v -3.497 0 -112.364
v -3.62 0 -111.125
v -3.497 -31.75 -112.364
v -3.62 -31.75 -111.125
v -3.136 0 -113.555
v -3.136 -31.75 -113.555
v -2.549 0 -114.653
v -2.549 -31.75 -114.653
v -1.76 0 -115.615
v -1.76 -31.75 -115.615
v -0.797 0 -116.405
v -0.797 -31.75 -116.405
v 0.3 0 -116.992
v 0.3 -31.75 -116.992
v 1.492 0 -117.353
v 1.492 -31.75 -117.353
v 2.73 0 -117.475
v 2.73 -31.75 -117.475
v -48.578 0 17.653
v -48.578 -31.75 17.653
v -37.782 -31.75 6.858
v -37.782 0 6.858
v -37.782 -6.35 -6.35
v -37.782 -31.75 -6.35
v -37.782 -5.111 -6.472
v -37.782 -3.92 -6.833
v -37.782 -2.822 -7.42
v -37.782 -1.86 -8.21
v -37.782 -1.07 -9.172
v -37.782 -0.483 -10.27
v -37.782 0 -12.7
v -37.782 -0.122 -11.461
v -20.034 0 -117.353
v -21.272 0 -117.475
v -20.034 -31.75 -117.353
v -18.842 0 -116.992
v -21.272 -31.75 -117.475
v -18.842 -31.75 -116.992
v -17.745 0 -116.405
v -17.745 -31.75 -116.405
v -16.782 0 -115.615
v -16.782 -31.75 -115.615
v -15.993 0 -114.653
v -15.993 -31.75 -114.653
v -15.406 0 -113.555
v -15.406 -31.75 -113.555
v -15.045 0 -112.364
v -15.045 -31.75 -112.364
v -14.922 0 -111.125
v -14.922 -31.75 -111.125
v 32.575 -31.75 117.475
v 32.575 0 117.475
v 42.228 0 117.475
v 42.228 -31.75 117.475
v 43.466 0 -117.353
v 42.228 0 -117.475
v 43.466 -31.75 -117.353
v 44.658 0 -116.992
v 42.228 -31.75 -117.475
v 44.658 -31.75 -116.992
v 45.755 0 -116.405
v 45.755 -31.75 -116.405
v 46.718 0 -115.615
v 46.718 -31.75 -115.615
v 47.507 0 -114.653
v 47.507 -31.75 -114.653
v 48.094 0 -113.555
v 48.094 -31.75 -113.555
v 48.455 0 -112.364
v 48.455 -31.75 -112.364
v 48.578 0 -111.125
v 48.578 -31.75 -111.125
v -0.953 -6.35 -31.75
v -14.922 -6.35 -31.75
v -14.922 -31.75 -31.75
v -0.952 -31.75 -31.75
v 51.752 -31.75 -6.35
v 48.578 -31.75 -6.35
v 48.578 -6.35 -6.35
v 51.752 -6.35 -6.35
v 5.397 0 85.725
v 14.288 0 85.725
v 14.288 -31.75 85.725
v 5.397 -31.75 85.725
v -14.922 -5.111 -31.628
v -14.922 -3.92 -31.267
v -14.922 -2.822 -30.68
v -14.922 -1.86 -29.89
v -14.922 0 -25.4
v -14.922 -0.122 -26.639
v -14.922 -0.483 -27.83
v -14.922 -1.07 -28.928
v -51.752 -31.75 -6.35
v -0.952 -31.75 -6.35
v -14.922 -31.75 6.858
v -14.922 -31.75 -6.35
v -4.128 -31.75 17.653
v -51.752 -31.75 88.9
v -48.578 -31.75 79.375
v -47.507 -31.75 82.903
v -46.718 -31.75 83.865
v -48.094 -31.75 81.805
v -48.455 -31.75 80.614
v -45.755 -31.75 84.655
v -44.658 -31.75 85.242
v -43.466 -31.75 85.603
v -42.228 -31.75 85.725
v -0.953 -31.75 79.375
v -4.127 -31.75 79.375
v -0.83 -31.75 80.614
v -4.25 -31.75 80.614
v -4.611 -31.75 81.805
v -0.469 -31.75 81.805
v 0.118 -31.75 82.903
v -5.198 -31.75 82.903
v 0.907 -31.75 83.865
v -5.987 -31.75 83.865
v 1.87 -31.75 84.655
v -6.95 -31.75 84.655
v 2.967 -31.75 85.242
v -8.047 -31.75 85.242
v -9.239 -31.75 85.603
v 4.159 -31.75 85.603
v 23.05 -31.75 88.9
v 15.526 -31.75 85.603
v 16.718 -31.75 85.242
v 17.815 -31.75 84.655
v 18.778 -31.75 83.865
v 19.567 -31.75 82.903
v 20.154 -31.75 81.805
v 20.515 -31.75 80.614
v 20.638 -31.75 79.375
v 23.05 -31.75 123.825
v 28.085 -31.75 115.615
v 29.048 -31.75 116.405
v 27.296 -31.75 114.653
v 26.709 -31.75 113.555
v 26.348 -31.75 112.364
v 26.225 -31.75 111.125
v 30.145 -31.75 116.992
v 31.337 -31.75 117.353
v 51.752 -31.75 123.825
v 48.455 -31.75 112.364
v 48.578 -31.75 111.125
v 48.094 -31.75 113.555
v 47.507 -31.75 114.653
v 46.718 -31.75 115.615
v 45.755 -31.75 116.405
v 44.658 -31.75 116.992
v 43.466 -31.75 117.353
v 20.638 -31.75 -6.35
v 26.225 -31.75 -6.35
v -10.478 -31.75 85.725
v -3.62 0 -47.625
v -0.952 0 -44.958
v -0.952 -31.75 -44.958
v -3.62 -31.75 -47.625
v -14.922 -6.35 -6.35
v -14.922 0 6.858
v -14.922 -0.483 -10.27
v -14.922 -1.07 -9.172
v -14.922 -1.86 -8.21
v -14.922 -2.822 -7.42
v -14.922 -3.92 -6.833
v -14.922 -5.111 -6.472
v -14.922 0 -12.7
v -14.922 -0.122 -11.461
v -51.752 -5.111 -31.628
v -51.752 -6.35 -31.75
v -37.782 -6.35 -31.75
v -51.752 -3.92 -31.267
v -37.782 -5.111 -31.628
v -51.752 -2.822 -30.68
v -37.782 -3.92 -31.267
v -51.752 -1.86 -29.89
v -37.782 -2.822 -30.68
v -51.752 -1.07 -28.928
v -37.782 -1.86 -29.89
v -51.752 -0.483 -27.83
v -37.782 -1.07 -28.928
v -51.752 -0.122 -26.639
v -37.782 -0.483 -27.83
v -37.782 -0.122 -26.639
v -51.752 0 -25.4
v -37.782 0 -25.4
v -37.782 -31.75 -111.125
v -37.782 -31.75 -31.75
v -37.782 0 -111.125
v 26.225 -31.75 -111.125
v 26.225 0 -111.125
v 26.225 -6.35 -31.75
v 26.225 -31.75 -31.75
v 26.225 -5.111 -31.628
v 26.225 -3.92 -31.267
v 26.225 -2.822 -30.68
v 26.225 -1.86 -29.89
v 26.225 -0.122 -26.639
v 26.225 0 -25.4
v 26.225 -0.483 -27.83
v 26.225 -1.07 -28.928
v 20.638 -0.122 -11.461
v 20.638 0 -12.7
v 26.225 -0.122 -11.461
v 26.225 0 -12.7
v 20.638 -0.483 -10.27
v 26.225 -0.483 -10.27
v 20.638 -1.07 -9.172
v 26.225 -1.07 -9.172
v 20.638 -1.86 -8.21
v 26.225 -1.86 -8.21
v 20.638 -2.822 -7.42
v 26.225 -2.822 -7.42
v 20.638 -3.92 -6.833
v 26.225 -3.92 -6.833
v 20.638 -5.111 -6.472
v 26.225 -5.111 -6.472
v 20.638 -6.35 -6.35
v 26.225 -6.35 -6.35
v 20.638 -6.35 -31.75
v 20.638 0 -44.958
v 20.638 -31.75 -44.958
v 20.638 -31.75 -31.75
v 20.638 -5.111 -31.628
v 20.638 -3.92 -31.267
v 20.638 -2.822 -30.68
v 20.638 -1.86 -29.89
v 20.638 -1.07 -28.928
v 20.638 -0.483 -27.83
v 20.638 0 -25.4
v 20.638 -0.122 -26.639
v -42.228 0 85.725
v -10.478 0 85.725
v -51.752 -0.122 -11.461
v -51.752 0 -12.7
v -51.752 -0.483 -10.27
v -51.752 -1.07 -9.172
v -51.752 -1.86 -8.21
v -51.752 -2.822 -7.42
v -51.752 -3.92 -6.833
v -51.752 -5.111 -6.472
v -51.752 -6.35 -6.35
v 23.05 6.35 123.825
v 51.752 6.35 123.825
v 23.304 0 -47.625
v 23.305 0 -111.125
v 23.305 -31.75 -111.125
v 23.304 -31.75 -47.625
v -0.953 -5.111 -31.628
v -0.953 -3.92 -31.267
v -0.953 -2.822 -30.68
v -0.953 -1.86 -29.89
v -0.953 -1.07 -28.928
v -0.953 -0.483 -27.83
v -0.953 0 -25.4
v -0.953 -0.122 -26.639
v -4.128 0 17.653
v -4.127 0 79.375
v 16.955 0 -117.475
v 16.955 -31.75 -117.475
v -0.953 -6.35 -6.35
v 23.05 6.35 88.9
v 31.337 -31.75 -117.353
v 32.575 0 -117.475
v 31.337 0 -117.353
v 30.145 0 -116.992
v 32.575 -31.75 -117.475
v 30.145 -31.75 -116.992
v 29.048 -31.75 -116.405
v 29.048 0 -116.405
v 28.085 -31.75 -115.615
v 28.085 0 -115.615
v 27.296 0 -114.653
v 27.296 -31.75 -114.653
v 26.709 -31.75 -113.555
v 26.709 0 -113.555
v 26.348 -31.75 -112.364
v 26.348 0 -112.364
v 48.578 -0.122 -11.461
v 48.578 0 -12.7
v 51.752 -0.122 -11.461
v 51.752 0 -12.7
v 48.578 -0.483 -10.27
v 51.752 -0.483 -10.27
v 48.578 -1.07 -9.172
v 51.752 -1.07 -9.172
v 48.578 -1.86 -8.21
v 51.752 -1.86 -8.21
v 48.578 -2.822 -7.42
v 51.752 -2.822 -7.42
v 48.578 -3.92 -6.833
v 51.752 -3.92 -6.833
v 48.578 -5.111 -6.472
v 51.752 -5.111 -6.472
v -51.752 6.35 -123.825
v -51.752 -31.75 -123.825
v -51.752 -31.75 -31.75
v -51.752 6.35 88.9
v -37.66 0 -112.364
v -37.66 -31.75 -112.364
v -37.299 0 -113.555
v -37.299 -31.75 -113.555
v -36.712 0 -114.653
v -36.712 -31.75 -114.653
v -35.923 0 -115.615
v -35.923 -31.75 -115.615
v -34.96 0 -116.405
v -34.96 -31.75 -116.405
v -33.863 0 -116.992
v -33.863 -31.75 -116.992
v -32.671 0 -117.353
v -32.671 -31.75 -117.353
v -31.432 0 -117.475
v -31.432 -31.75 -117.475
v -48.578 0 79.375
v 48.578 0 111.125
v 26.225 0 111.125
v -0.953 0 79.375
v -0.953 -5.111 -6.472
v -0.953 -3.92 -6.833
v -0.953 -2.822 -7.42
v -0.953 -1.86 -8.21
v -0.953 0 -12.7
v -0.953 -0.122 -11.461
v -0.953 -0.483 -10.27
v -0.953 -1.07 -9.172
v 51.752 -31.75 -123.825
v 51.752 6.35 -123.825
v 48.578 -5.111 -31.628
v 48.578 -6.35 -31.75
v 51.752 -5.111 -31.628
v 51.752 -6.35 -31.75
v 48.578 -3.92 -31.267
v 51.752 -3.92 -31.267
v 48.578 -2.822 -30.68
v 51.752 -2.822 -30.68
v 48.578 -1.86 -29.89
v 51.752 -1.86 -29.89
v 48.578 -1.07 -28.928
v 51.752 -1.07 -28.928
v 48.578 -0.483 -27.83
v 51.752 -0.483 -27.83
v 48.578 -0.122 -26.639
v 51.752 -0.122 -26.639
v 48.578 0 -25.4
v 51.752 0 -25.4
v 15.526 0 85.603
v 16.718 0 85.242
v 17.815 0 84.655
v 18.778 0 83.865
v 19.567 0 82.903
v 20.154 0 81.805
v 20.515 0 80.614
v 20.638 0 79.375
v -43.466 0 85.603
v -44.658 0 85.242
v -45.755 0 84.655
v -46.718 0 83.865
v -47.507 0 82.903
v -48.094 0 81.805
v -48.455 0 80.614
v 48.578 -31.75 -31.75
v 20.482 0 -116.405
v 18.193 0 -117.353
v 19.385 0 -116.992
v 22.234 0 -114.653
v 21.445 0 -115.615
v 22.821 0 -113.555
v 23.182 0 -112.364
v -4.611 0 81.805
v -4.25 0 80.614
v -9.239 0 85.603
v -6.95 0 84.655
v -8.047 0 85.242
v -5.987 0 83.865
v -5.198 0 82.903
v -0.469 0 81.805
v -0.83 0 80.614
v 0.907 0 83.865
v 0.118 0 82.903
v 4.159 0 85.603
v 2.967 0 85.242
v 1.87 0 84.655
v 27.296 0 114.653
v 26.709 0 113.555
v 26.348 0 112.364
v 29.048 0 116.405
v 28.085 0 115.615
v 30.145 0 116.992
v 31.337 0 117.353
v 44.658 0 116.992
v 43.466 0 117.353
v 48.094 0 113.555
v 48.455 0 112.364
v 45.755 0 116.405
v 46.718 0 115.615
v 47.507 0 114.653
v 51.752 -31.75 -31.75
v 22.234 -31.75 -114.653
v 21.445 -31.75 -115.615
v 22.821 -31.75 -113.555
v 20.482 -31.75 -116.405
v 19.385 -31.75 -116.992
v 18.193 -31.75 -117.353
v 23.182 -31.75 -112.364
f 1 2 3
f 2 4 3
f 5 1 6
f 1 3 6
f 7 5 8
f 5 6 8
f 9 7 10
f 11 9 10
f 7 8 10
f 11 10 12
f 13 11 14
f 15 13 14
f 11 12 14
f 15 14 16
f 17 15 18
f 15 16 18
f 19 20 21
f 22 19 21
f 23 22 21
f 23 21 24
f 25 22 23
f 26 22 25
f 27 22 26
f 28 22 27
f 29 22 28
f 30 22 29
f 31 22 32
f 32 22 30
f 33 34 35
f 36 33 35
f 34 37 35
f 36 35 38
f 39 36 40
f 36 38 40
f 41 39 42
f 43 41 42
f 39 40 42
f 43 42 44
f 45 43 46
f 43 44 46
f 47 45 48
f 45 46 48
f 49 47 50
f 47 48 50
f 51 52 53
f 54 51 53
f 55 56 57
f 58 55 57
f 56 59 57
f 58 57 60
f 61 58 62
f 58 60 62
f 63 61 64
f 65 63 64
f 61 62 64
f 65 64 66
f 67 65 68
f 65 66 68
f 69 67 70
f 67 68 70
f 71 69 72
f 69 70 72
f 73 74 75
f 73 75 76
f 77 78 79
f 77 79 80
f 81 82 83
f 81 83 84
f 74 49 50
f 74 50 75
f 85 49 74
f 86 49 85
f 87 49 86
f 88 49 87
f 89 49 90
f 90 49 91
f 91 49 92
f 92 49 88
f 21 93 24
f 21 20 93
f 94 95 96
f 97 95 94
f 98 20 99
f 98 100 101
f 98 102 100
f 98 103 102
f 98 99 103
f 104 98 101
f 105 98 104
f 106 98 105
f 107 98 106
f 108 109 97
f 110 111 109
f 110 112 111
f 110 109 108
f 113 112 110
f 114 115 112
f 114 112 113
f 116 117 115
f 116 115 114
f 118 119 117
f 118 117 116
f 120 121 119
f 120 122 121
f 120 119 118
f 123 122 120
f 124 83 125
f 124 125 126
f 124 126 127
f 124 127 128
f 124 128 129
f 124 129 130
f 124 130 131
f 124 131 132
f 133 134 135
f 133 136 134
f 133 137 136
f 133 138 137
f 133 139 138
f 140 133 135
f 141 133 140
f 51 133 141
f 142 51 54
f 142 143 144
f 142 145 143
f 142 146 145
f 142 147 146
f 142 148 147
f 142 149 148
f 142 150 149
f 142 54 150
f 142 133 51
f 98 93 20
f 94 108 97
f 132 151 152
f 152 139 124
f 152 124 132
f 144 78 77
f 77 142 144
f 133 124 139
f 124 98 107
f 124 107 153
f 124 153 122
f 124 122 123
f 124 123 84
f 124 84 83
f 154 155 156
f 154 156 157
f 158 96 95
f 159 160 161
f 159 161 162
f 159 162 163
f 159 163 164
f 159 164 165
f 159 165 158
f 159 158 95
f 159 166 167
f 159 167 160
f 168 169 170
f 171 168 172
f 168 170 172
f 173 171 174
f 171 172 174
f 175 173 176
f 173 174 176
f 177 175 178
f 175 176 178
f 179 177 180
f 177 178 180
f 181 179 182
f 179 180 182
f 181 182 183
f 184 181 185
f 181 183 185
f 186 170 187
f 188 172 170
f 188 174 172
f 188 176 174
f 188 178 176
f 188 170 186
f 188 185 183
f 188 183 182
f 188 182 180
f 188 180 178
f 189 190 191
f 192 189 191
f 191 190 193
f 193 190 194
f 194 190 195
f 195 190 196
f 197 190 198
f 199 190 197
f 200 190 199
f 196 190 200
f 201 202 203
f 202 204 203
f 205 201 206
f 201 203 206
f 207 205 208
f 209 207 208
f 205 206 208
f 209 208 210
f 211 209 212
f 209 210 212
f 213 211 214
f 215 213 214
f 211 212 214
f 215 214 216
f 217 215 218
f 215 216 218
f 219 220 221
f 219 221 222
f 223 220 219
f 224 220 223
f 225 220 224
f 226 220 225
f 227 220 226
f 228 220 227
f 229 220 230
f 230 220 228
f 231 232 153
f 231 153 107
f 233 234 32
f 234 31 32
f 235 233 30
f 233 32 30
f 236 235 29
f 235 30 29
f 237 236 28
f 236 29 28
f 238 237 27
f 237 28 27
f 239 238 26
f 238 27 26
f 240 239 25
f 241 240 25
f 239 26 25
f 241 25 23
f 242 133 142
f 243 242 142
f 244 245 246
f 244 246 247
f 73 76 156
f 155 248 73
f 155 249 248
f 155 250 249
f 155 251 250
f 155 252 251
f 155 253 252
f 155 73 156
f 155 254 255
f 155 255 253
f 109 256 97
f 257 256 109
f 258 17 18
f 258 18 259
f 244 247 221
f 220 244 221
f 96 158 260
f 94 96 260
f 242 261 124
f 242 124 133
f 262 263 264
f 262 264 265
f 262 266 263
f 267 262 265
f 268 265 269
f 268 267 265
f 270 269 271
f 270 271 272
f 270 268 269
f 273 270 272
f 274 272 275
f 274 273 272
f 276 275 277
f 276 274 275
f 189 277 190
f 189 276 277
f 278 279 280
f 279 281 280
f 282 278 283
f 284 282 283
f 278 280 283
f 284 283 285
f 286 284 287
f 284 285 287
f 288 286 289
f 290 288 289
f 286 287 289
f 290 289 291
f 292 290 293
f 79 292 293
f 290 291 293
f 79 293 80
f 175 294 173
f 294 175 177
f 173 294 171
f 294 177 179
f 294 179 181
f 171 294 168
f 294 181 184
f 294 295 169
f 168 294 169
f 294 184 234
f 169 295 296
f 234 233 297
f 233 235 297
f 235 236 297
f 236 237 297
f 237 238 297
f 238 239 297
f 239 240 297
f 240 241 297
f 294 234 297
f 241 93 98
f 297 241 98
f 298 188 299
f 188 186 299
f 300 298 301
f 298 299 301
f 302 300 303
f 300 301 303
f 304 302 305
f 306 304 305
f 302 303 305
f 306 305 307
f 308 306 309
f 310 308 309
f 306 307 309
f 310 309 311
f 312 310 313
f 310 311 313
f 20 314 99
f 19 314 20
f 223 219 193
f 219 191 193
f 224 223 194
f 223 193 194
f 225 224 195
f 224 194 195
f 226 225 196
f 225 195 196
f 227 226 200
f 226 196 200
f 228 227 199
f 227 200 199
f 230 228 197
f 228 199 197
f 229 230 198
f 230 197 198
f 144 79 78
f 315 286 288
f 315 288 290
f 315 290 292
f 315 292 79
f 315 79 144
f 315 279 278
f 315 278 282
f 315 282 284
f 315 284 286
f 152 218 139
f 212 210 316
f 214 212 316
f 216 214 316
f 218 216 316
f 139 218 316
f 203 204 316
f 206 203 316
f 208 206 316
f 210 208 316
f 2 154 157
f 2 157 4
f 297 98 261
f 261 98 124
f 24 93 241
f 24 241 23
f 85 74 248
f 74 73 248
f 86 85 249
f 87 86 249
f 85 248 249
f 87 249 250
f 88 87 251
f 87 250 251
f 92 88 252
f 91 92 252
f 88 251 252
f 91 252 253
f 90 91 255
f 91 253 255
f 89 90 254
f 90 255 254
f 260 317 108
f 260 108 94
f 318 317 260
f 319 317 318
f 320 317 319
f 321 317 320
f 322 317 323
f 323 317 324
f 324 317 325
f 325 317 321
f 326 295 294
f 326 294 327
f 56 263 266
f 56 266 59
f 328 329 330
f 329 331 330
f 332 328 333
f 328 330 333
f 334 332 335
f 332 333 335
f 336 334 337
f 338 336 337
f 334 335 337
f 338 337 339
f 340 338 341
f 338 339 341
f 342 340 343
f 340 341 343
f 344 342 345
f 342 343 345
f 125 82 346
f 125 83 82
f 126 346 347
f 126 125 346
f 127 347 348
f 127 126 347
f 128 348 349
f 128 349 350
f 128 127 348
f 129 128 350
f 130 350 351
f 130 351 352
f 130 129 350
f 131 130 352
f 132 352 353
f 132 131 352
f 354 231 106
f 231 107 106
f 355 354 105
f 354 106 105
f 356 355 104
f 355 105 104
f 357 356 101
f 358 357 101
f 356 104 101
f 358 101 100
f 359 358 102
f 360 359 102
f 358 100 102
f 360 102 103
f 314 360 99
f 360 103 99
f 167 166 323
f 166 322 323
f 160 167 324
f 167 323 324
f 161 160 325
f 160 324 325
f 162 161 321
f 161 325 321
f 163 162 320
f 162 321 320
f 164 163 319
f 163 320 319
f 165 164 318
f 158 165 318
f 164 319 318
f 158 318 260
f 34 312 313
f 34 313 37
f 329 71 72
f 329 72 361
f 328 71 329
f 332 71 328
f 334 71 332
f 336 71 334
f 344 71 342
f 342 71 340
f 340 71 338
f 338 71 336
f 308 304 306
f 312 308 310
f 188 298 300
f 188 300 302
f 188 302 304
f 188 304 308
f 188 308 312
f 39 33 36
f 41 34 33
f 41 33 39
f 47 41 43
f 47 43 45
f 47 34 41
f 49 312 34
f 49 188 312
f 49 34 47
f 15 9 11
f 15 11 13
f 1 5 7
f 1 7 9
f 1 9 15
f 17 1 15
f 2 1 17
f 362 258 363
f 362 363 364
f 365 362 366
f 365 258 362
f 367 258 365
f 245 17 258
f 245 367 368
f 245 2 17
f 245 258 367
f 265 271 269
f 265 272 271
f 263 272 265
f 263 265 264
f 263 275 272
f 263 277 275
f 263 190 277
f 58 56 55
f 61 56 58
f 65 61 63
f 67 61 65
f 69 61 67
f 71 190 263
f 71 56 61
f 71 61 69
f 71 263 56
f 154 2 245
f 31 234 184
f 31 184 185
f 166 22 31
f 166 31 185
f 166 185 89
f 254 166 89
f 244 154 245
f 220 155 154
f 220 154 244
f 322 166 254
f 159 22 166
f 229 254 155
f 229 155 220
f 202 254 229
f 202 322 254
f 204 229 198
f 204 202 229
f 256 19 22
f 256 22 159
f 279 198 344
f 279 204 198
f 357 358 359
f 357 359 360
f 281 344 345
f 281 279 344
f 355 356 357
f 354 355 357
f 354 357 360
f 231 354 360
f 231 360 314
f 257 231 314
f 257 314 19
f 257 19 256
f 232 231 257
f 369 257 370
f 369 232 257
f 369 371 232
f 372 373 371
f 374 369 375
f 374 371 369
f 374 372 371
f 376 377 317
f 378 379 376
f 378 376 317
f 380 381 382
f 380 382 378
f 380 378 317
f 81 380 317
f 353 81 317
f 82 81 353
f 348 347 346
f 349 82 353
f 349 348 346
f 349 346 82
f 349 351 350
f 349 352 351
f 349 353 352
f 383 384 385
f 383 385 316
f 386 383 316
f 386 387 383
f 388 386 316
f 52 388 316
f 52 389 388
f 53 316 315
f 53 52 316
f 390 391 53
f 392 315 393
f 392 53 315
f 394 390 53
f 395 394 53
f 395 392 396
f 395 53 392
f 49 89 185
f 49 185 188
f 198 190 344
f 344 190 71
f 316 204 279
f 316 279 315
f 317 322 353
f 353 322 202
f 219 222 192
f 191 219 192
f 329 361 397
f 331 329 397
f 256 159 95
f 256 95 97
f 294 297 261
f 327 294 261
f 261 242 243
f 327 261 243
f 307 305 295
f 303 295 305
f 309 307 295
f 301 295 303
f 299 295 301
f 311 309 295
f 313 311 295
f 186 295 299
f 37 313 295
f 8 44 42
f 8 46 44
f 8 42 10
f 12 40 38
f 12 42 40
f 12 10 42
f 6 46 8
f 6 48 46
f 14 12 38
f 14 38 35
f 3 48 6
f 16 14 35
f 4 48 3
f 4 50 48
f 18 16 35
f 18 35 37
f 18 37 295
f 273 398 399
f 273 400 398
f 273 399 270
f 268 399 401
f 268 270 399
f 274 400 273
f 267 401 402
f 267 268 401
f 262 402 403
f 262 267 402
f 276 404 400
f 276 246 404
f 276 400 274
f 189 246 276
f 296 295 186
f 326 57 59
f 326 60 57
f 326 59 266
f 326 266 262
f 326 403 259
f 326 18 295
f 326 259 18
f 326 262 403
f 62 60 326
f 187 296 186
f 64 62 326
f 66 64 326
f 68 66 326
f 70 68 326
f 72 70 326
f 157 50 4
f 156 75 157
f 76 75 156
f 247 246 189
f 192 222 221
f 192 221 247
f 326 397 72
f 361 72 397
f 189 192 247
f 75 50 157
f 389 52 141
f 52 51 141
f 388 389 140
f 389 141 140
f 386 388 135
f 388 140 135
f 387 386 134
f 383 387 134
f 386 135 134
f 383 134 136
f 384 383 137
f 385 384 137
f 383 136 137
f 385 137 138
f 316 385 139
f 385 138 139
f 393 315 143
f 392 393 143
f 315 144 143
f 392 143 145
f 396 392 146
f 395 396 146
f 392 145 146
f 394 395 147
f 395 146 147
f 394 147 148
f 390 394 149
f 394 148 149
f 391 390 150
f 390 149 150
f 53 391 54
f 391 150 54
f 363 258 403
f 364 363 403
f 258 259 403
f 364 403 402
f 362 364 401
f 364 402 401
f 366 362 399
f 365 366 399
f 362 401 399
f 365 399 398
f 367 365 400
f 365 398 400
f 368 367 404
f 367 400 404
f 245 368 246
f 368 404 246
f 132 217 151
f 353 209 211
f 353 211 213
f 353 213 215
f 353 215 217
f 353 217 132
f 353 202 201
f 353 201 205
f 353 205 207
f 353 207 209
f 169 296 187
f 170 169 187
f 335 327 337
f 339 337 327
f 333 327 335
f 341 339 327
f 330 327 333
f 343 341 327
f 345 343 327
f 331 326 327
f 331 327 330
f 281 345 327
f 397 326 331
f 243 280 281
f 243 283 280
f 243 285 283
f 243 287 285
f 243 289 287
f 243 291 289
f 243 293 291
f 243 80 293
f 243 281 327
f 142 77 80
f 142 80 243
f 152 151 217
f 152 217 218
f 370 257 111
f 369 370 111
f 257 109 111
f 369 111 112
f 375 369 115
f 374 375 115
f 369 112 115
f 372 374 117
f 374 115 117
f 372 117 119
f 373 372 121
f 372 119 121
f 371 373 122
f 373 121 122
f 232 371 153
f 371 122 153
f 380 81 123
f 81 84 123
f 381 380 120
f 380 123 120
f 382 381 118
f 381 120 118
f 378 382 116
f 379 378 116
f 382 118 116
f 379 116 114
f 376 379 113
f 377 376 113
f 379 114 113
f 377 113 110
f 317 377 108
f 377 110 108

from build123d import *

# Parameters (mm, degrees)
F0_W          = 103.505
F0_H          = 247.65
F1_DEPTH      = 31.75
F1_DEPTH_BACK = 6.35
F2_W          = 22.352
F2_H          = 234.95
F3_DEPTH      = 31.75
F4_R          = 6.35
F5_W          = 74.803
F5_H          = 34.925
F6_DEPTH      = 38.101
F7_W          = 103.505
F7_H          = 25.4
F8_DEPTH      = 31.75
F9_R          = 6.35


with BuildPart() as f1:
    # F0 (on Front) → F1 (new body, two sides)
    with BuildSketch(Plane.XZ) as f1_sk:
        Rectangle(F0_W, F0_H)
    extrude(amount=F1_DEPTH)
    extrude(f1_sk.sketch, amount=-F1_DEPTH_BACK)

    # F2 (on Front) → F3 (cut, through all)
    with BuildSketch(Plane.XZ):
        with Locations((37.4015, 0)):
            Rectangle(F2_W, F2_H)
        Polygon((20.6375, 85.725), (-0.9525, 85.725), (-0.9525, -44.958), (-3.6195, -47.625), (-3.6195, -117.475), (23.3045, -117.475), (23.3045, -47.625), (20.6375, -44.958), align=None)
        Polygon((-37.7825, 6.858), (-37.7825, -117.475), (-14.9225, -117.475), (-14.9225, 6.858), (-4.1275, 17.653), (-4.1275, 85.725), (-48.5775, 85.725), (-48.5775, 17.653), align=None)
    extrude(amount=F3_DEPTH, mode=Mode.SUBTRACT)

    # F4
    f4_edges = [f1.edges().sort_by_distance(p)[0] for p in [
        (-48.5775, -15.875, 85.725),
        (-4.1275, -15.875, 85.725),
        (20.6375, -15.875, 85.725),
        (-0.9525, -15.875, 85.725),
        (-14.9225, -15.875, -117.475),
        (-37.7825, -15.875, -117.475),
        (23.3045, -15.875, -117.475),
        (-3.6195, -15.875, -117.475),
        (48.5775, -15.875, 117.475),
        (26.2255, -15.875, 117.475),
        (26.2255, -15.875, -117.475),
        (48.5775, -15.875, -117.475),
    ]]
    fillet(f4_edges, radius=F4_R)

    # F5 (on face) → F6 (cut, through all)
    with BuildSketch(Plane.XZ.offset(31.75)):
        with Locations((-14.351, 106.3625)):
            Rectangle(F5_W, F5_H)
    extrude(amount=-F6_DEPTH, mode=Mode.SUBTRACT)

    # F7 (on face) → F8 (cut)
    with BuildSketch(Plane.XZ.offset(31.75)):
        with Locations((0, -19.05)):
            Rectangle(F7_W, F7_H)
    extrude(amount=-F8_DEPTH, mode=Mode.SUBTRACT)

    # F9
    f9_edges = [f1.edges().sort_by_distance(p)[0] for p in [
        (-44.7675, 0, -6.35),
        (50.165, 0, -6.35),
        (23.4315, 0, -6.35),
        (-7.9375, 0, -6.35),
        (-44.7675, 0, -31.75),
        (-7.9375, 0, -31.75),
        (23.4315, 0, -31.75),
        (50.165, 0, -31.75),
    ]]
    fillet(f9_edges, radius=F9_R)


solid = f1.part
